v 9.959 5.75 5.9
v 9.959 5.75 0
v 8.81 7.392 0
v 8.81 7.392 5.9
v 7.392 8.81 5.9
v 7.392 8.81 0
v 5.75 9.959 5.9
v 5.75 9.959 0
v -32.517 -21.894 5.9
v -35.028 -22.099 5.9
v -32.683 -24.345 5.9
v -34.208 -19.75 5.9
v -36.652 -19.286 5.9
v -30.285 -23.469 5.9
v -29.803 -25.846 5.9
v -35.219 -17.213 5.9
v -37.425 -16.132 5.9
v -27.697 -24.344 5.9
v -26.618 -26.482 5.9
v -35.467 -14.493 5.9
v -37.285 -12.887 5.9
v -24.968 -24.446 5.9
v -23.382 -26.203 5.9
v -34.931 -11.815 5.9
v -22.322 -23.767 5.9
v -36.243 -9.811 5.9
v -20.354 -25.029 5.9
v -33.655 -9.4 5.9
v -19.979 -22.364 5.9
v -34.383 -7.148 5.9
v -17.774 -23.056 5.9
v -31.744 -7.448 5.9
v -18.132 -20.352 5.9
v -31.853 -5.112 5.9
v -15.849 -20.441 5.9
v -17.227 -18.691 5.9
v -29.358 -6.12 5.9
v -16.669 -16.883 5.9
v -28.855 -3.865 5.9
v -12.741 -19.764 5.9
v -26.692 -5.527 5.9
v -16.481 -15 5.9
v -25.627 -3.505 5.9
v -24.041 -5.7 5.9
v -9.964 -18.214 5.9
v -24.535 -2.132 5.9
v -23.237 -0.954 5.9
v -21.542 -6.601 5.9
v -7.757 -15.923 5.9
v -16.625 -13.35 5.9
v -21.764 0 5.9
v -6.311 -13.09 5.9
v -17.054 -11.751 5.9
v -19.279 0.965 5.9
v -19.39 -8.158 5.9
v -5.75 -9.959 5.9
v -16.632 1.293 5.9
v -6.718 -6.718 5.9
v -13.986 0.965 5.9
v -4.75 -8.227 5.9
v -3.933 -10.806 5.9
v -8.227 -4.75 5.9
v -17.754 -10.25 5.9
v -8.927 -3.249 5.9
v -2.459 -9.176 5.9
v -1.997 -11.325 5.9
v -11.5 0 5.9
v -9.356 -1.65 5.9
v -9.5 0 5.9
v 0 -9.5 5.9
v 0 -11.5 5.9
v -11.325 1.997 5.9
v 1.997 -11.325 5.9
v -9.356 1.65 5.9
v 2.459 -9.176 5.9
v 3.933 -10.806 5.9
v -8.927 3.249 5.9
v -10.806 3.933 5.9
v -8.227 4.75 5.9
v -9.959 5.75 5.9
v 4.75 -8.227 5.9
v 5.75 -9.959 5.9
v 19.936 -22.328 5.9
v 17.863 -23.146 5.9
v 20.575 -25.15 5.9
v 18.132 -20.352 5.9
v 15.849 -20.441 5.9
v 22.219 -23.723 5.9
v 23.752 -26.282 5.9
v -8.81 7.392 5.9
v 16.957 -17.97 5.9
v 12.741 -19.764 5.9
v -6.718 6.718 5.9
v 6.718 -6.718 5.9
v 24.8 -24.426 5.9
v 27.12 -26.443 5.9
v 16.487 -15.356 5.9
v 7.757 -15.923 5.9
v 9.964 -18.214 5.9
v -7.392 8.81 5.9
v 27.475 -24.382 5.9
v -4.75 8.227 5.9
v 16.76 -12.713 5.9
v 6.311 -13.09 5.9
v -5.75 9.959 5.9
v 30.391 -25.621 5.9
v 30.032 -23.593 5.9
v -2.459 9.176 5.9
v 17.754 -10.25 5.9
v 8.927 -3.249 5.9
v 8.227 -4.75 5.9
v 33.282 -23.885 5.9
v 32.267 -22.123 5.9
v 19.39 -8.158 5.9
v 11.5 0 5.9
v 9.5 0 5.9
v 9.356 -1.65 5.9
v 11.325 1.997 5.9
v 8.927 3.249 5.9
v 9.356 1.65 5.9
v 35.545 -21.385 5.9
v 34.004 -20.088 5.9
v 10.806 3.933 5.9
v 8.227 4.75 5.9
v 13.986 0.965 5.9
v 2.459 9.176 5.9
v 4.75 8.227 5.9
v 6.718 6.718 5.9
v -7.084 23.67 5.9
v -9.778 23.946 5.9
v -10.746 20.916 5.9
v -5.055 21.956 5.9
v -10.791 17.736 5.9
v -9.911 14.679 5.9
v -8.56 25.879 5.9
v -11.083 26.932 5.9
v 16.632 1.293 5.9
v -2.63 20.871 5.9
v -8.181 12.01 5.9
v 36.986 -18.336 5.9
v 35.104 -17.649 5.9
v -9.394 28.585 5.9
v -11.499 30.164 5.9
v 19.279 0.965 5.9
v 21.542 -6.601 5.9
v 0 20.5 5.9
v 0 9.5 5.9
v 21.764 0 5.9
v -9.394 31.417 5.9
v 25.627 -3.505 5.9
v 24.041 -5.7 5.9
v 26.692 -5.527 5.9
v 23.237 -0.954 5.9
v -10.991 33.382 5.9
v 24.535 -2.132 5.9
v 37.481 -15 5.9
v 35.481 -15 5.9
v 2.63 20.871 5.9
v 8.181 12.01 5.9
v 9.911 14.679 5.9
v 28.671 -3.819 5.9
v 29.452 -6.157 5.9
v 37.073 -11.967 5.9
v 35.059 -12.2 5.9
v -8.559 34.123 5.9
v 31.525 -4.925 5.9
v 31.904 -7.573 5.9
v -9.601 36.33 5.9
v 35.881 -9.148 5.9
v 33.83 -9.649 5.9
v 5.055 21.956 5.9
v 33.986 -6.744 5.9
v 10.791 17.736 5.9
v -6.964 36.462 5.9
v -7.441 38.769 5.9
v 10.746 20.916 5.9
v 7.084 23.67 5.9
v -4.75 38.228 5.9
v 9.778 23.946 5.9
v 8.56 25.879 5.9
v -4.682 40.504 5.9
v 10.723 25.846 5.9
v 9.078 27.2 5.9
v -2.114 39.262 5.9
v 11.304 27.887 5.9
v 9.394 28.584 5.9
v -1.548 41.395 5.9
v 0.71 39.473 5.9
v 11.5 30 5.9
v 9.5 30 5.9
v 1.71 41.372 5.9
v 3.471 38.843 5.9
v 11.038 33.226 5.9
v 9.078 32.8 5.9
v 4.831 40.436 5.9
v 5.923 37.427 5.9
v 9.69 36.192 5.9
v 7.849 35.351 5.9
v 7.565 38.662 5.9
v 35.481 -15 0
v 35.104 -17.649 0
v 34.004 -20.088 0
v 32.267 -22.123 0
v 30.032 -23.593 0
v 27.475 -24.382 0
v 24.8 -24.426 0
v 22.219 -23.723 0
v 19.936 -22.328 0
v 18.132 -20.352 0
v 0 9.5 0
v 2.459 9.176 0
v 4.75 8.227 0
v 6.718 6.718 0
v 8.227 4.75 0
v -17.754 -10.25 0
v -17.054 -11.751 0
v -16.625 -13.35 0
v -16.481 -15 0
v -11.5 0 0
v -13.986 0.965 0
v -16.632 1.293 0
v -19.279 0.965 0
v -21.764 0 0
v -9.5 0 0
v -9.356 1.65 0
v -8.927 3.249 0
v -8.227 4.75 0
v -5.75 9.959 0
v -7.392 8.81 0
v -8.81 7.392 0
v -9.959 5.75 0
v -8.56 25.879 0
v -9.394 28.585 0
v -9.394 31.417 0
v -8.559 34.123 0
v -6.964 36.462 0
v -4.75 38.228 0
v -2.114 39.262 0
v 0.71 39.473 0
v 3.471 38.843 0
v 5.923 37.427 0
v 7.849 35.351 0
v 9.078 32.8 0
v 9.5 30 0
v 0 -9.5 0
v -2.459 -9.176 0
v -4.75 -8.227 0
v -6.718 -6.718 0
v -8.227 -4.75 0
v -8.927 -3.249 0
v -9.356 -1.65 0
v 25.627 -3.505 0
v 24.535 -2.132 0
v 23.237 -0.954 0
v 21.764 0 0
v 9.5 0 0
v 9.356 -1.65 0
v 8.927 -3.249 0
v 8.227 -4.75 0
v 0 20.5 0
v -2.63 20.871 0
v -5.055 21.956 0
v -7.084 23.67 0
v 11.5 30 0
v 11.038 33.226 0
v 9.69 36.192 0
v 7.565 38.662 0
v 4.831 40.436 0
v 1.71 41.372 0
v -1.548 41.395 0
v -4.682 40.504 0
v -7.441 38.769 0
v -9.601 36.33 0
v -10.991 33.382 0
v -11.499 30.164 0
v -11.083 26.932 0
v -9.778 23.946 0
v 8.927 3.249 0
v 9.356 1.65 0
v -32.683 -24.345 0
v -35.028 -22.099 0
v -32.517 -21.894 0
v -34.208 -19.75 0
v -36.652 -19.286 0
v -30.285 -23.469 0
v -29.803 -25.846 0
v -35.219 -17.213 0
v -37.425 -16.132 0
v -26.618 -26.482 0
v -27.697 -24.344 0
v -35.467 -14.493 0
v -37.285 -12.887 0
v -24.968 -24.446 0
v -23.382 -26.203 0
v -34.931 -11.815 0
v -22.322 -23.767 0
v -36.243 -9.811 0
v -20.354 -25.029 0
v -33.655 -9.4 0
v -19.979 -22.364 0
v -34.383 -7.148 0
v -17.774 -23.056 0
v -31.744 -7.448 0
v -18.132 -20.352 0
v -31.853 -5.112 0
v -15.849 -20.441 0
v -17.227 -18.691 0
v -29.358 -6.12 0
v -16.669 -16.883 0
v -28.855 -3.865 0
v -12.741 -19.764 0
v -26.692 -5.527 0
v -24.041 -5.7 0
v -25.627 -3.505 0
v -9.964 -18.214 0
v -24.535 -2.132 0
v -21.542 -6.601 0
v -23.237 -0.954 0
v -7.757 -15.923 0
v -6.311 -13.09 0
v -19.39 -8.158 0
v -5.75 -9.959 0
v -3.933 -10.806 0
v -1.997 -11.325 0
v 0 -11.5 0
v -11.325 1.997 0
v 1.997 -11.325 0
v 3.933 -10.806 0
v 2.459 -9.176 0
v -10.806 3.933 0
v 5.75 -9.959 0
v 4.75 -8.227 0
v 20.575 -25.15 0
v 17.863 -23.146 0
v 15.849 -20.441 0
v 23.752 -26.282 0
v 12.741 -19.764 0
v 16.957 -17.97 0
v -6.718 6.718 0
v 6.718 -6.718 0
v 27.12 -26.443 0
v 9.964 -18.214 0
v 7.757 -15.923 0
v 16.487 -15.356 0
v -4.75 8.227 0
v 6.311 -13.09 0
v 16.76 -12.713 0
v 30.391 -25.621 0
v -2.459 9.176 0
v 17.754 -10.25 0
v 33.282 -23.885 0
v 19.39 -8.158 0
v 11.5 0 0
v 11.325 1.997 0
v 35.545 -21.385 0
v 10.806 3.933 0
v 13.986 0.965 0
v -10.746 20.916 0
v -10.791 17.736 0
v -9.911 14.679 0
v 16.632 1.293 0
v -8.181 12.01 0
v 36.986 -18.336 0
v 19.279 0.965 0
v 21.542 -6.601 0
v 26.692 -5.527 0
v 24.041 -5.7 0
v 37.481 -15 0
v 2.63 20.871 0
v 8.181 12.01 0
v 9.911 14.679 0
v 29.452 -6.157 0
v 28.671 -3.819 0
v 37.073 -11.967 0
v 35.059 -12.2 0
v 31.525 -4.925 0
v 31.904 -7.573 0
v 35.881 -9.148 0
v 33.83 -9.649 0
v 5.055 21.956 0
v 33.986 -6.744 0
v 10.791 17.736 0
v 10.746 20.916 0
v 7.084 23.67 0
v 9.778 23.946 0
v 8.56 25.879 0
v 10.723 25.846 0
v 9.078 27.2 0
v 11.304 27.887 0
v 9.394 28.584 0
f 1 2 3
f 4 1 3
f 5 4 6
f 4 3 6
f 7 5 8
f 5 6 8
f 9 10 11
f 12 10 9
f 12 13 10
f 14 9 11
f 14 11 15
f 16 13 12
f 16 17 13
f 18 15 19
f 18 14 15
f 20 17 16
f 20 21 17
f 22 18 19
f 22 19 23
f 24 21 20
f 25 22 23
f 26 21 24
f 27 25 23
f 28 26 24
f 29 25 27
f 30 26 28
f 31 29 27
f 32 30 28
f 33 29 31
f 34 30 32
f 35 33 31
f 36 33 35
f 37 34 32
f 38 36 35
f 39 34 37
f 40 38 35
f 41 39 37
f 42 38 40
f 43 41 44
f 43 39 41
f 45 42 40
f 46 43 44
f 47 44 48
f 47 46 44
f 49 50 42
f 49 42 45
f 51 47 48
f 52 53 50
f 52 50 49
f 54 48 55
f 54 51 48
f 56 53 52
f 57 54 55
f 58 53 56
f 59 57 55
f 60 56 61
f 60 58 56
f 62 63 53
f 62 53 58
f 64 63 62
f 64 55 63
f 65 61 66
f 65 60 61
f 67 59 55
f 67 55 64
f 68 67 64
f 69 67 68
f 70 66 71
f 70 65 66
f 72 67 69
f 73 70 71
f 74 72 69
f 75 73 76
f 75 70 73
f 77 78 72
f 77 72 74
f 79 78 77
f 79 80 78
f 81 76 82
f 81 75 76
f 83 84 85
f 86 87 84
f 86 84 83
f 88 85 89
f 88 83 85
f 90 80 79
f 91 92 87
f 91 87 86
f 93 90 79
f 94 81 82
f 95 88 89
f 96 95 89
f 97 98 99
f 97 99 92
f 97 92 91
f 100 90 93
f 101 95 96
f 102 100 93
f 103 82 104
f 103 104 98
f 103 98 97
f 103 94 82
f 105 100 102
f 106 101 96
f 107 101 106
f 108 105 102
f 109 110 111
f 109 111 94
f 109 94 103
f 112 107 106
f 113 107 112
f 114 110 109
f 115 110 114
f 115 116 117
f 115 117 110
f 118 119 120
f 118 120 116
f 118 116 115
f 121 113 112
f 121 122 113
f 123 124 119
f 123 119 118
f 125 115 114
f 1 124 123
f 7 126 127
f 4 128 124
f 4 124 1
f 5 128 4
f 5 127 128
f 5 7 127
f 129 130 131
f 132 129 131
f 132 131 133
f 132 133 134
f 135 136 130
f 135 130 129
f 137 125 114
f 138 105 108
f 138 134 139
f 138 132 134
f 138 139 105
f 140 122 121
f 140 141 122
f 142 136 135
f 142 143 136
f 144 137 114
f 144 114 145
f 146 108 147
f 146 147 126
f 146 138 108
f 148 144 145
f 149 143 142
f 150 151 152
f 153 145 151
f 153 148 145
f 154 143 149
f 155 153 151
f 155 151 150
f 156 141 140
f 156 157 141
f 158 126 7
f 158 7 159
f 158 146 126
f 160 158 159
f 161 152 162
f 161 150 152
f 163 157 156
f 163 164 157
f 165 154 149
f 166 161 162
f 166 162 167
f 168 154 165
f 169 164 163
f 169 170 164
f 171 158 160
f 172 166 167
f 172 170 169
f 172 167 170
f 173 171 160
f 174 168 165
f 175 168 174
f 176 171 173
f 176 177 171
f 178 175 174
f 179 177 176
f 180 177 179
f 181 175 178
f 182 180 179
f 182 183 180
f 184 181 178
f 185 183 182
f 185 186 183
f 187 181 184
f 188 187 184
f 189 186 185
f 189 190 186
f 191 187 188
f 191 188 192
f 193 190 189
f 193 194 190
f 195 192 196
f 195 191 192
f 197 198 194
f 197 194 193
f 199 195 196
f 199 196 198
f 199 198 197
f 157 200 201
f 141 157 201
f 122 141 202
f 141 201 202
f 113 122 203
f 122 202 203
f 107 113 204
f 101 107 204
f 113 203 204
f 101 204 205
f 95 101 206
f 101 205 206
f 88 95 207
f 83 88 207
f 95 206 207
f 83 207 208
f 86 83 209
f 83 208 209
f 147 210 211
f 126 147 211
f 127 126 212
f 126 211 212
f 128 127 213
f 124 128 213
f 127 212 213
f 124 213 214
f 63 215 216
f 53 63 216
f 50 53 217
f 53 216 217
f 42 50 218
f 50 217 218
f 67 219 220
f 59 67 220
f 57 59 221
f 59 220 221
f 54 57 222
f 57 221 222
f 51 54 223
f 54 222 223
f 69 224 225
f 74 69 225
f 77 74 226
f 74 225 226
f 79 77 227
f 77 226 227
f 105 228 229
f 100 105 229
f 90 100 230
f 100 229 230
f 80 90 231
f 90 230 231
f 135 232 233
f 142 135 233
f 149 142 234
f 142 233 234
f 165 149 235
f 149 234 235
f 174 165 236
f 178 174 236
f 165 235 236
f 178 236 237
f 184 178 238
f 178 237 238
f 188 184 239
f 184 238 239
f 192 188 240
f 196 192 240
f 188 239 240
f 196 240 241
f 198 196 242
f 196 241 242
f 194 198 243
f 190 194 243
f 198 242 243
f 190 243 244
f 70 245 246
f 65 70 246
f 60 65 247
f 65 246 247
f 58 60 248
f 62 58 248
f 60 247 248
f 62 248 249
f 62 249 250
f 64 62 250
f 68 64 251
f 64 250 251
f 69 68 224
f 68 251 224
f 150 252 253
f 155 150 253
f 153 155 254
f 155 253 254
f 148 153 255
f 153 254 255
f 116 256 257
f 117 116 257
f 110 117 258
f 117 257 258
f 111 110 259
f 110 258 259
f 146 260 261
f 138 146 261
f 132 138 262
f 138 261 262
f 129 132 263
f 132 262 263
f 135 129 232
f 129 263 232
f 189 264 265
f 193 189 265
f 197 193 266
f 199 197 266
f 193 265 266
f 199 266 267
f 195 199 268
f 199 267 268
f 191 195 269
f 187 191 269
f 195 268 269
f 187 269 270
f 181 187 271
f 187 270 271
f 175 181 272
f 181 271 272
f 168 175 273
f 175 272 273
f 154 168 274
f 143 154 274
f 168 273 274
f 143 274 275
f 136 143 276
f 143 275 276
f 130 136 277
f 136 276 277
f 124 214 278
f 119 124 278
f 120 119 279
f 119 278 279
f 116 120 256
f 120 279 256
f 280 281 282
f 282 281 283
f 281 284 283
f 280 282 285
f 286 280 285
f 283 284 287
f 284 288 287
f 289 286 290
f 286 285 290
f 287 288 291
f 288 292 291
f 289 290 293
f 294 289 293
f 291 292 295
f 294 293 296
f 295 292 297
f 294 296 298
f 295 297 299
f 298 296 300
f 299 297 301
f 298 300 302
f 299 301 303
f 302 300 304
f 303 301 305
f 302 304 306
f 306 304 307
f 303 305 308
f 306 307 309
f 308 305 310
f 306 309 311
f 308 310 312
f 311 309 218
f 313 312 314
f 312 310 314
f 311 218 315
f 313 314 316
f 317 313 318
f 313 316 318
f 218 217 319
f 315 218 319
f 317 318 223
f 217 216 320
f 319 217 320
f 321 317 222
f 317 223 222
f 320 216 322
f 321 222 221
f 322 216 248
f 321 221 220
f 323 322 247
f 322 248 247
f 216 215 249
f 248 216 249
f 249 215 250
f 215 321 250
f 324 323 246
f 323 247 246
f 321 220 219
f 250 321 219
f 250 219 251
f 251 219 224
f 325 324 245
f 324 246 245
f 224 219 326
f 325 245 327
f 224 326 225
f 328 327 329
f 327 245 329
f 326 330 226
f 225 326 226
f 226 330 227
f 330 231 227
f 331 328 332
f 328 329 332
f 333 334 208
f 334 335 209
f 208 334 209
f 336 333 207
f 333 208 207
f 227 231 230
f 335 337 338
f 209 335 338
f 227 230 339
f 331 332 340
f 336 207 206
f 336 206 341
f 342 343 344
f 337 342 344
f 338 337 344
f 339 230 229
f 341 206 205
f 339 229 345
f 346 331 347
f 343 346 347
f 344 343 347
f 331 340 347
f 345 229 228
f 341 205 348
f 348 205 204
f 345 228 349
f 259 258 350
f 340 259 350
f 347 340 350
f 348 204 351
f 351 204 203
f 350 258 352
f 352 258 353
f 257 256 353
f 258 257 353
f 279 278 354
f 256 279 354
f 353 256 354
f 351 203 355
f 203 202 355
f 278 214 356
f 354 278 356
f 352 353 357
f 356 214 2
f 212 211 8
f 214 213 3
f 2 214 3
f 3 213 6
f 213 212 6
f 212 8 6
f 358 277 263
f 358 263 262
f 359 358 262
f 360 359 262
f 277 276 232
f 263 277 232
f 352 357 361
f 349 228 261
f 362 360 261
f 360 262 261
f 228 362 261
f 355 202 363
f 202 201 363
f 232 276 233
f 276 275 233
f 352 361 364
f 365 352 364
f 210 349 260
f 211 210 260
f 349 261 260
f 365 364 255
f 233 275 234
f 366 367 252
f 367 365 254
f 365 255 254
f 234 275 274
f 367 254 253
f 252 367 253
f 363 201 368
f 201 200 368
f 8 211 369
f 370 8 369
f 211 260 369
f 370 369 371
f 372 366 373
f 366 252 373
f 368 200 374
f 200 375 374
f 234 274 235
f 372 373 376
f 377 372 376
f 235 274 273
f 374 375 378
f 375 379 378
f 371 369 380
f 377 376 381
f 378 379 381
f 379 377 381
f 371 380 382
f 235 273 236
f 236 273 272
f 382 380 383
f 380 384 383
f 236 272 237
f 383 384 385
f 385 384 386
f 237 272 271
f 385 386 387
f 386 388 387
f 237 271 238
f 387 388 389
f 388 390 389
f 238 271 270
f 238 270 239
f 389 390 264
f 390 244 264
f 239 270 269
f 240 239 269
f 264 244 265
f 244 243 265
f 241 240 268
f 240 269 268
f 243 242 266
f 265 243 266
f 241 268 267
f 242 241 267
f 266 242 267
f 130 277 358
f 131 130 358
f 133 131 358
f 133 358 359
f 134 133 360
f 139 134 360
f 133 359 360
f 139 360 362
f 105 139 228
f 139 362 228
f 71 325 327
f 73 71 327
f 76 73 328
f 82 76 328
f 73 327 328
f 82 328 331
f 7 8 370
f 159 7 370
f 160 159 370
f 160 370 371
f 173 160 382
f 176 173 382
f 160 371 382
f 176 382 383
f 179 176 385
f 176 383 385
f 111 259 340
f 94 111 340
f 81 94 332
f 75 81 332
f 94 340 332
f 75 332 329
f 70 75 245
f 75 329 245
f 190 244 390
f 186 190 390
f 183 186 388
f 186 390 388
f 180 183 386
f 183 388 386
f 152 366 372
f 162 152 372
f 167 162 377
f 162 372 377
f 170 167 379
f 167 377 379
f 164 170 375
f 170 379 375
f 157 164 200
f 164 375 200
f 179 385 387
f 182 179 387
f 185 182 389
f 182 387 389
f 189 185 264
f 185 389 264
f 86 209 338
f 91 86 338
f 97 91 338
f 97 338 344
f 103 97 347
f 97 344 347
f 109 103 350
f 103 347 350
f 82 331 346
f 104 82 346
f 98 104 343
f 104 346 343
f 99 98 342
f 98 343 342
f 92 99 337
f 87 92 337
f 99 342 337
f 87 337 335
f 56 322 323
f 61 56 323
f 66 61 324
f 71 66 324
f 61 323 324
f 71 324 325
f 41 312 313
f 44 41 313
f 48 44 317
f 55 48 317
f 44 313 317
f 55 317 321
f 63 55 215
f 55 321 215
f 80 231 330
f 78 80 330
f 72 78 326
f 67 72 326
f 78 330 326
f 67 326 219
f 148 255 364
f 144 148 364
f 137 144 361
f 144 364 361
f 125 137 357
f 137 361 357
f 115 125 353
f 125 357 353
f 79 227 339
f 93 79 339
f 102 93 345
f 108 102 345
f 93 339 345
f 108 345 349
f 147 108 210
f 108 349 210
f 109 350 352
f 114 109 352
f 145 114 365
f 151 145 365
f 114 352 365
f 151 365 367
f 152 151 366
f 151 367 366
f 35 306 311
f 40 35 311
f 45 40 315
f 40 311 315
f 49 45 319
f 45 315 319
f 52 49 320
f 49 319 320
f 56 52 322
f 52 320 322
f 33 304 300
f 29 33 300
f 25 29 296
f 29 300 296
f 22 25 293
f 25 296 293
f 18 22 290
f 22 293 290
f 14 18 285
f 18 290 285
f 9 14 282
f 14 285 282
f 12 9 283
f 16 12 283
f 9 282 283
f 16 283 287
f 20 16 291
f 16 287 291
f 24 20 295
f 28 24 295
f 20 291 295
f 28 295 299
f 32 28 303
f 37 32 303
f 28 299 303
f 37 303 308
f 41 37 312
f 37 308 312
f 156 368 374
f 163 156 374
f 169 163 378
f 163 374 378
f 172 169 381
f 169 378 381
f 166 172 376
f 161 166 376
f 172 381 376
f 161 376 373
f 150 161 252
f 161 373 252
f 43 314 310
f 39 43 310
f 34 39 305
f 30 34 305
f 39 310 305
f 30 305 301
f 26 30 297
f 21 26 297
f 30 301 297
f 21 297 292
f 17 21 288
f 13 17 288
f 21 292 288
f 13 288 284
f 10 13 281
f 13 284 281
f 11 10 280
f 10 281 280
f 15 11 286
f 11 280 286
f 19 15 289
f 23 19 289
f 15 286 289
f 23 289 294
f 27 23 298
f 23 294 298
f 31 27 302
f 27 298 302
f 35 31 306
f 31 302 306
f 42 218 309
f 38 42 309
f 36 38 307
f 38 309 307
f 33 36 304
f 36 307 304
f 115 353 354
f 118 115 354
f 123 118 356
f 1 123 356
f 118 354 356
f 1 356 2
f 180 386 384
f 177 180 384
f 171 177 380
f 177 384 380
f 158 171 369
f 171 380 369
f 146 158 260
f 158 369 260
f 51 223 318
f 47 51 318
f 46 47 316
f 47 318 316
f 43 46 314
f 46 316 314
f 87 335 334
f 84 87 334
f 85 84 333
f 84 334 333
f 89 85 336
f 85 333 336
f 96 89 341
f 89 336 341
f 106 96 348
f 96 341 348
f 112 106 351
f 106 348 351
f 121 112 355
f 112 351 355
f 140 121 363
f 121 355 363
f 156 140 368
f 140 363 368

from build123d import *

# Parameters (mm, degrees)
F1_DEPTH = 5.9


with BuildPart() as f1:
    # F0 (on Top) → F1 (new body)
    with BuildSketch(Plane.XY):
        with BuildLine():
            Line((11.5, 0), (9.5, 0))
            ThreePointArc((9.5, 0), (9.1762953497, -2.4587809285), (8.227241336, -4.75))
            Line((8.227241336, -4.75), (9.9592921435, -5.75))
            ThreePointArc((9.9592921435, -5.75), (11.1081470023, -2.9764190187), (11.5, 0))
        make_face()
        with BuildLine():
            ThreePointArc((8.227241336, 4.75), (9.1762953497, 2.4587809285), (9.5, 0))
            Line((9.5, 0), (11.5, 0))
            ThreePointArc((11.5, 0), (11.1081470023, 2.9764190187), (9.9592921435, 5.75))
            Line((9.9592921435, 5.75), (8.227241336, 4.75))
        make_face()
        with BuildLine():
            ThreePointArc((0, 9.5), (4.75, 8.227241336), (8.227241336, 4.75))
            Line((8.227241336, 4.75), (9.9592921435, 5.75))
            ThreePointArc((9.9592921435, 5.75), (8.1317279836, 8.1317279836), (5.75, 9.9592921435))
            ThreePointArc((5.75, 9.9592921435), (2.9764190187, 11.1081470023), (0, 11.5))
            Line((0, 11.5), (0, 9.5))
        make_face()
        with BuildLine():
            Line((9.9592921435, -5.75), (8.227241336, -4.75))
            ThreePointArc((8.227241336, -4.75), (4.75, -8.227241336), (0, -9.5))
            Line((0, -9.5), (0, -11.5))
            ThreePointArc((0, -11.5), (2.9764190187, -11.1081470023), (5.75, -9.9592921435))
            ThreePointArc((5.75, -9.9592921435), (8.1317279836, -8.1317279836), (9.9592921435, -5.75))
        make_face()
        with BuildLine():
            Line((21.7644823154, 0), (11.5, 0))
            ThreePointArc((11.5, 0), (11.1081470023, -2.9764190187), (9.9592921435, -5.75))
            Line((9.9592921435, -5.75), (16.02146997, -9.25))
            ThreePointArc((16.02146997, -9.25), (20.0781480078, -5.1303927779), (25.6267837466, -3.5054491468))
            ThreePointArc((25.6267837466, -3.5054491468), (23.9098470955, -1.5167036662), (21.7644823154, 0))
        make_face()
        with BuildLine():
            ThreePointArc((21.7644823154, 0), (16.6322411577, 1.2934670156), (11.5, 0))
            Line((11.5, 0), (21.7644823154, 0))
        make_face()
        with BuildLine():
            ThreePointArc((-8.227241336, 4.75), (-4.75, 8.227241336), (0, 9.5))
            Line((0, 9.5), (0, 11.5))
            ThreePointArc((0, 11.5), (-2.9764190187, 11.1081470023), (-5.75, 9.9592921435))
            ThreePointArc((-5.75, 9.9592921435), (-8.1317279836, 8.1317279836), (-9.9592921435, 5.75))
            Line((-9.9592921435, 5.75), (-8.227241336, 4.75))
        make_face()
        with BuildLine():
            Line((0, -11.5), (0, -9.5))
            ThreePointArc((0, -9.5), (-4.75, -8.227241336), (-8.227241336, -4.75))
            Line((-8.227241336, -4.75), (-9.9592921435, -5.75))
            ThreePointArc((-9.9592921435, -5.75), (-8.1317279836, -8.1317279836), (-5.75, -9.9592921435))
            ThreePointArc((-5.75, -9.9592921435), (-2.9764190187, -11.1081470023), (0, -11.5))
        make_face()
        with BuildLine():
            Line((16.02146997, -9.25), (9.9592921435, -5.75))
            ThreePointArc((9.9592921435, -5.75), (8.1317279836, -8.1317279836), (5.75, -9.9592921435))
            ThreePointArc((5.75, -9.9592921435), (8.7759533757, -17.1498563505), (15.8491998862, -20.4407211685))
            ThreePointArc((15.8491998862, -20.4407211685), (14.4821244809, -14.8229898467), (16.02146997, -9.25))
        make_face()
        with BuildLine():
            Line((-9.9592921435, -5.75), (-8.227241336, -4.75))
            ThreePointArc((-8.227241336, -4.75), (-9.1762953497, -2.4587809285), (-9.5, 0))
            Line((-9.5, 0), (-11.5, 0))
            ThreePointArc((-11.5, 0), (-11.1081470023, -2.9764190187), (-9.9592921435, -5.75))
        make_face()
        with BuildLine():
            Line((-11.5, 0), (-9.5, 0))
            ThreePointArc((-9.5, 0), (-9.1762953497, 2.4587809285), (-8.227241336, 4.75))
            Line((-8.227241336, 4.75), (-9.9592921435, 5.75))
            ThreePointArc((-9.9592921435, 5.75), (-11.1081470023, 2.9764190187), (-11.5, 0))
        make_face()
        with BuildLine():
            Line((0, 18.5), (0, 11.5))
            ThreePointArc((0, 11.5), (2.9764190187, 11.1081470023), (5.75, 9.9592921435))
            ThreePointArc((5.75, 9.9592921435), (10.464234583, 16.1751267411), (9.7775838605, 23.9461703153))
            ThreePointArc((9.7775838605, 23.9461703153), (5.5960235268, 19.9533826246), (0, 18.5))
        make_face()
        with BuildLine():
            ThreePointArc((-5.75, 9.9592921435), (-2.9764190187, 11.1081470023), (0, 11.5))
            Line((0, 11.5), (0, 18.5))
            ThreePointArc((0, 18.5), (-5.5960235268, 19.9533826246), (-9.7775838605, 23.9461703153))
            ThreePointArc((-9.7775838605, 23.9461703153), (-10.464234583, 16.1751267411), (-5.75, 9.9592921435))
        make_face()
        with BuildLine():
            ThreePointArc((25.6267837466, -3.5054491468), (20.0781480078, -5.1303927779), (16.02146997, -9.25))
            Line((16.02146997, -9.25), (17.7535207776, -10.25))
            ThreePointArc((17.7535207776, -10.25), (21.5421151907, -6.6006897013), (26.6916116991, -5.5266324432))
            ThreePointArc((26.6916116991, -5.5266324432), (26.212648084, -4.4878813308), (25.6267837466, -3.5054491468))
        make_face()
        with BuildLine():
            Line((17.7535207776, -10.25), (16.02146997, -9.25))
            ThreePointArc((16.02146997, -9.25), (14.4821244809, -14.8229898467), (15.8491998862, -20.4407211685))
            ThreePointArc((15.8491998862, -20.4407211685), (16.9929432837, -20.4568784758), (18.1320099427, -20.3522975778))
            ThreePointArc((18.1320099427, -20.3522975778), (16.4874225591, -15.3556741558), (17.7535207776, -10.25))
        make_face()
        with BuildLine():
            Line((-16.02146997, -9.25), (-9.9592921435, -5.75))
            ThreePointArc((-9.9592921435, -5.75), (-11.1081470023, -2.9764190187), (-11.5, 0))
            Line((-11.5, 0), (-21.7644823154, 0))
            ThreePointArc((-21.7644823154, 0), (-23.9098470955, -1.5167036662), (-25.6267837466, -3.5054491468))
            ThreePointArc((-25.6267837466, -3.5054491468), (-20.0781480078, -5.1303927779), (-16.02146997, -9.25))
        make_face()
        with BuildLine():
            ThreePointArc((-5.75, -9.9592921435), (-8.1317279836, -8.1317279836), (-9.9592921435, -5.75))
            Line((-9.9592921435, -5.75), (-16.02146997, -9.25))
            ThreePointArc((-16.02146997, -9.25), (-14.8726151112, -12.0235809813), (-14.4807621135, -15))
            ThreePointArc((-14.4807621135, -15), (-14.8281174582, -17.8050877335), (-15.8491998862, -20.4407211685))
            ThreePointArc((-15.8491998862, -20.4407211685), (-8.7759533757, -17.1498563505), (-5.75, -9.9592921435))
        make_face()
        with BuildLine():
            Line((-21.7644823154, 0), (-11.5, 0))
            ThreePointArc((-11.5, 0), (-16.6322411577, 1.2934670156), (-21.7644823154, 0))
        make_face()
        with BuildLine():
            ThreePointArc((37.4807621135, -15), (33.9863616782, -6.7440702759), (25.6267837466, -3.5054491468))
            ThreePointArc((25.6267837466, -3.5054491468), (26.212648084, -4.4878813308), (26.6916116991, -5.5266324432))
            ThreePointArc((26.6916116991, -5.5266324432), (32.945066496, -8.5386948324), (35.4807621135, -15))
            ThreePointArc((35.4807621135, -15), (28.7813740446, -24.077806608), (18.1320099427, -20.3522975778))
            ThreePointArc((18.1320099427, -20.3522975778), (16.9929432837, -20.4568784758), (15.8491998862, -20.4407211685))
            ThreePointArc((15.8491998862, -20.4407211685), (28.785849847, -26.1526446553), (37.4807621135, -15))
        make_face()
        with BuildLine():
            ThreePointArc((-9.7775838605, 23.9461703153), (-5.5960235268, 19.9533826246), (0, 18.5))
            Line((0, 18.5), (0, 20.5))
            ThreePointArc((0, 20.5), (-5.0546926316, 21.956363857), (-8.5596017564, 25.8789300209))
            ThreePointArc((-8.5596017564, 25.8789300209), (-9.2197048003, 24.9447598066), (-9.7775838605, 23.9461703153))
        make_face()
        with BuildLine():
            Line((0, 20.5), (0, 18.5))
            ThreePointArc((0, 18.5), (5.5960235268, 19.9533826246), (9.7775838605, 23.9461703153))
            ThreePointArc((9.7775838605, 23.9461703153), (9.2197048003, 24.9447598066), (8.5596017564, 25.8789300209))
            ThreePointArc((8.5596017564, 25.8789300209), (5.0546926316, 21.956363857), (0, 20.5))
        make_face()
        with BuildLine():
            ThreePointArc((8.5596017564, 25.8789300209), (9.2197048003, 24.9447598066), (9.7775838605, 23.9461703153))
            ThreePointArc((9.7775838605, 23.9461703153), (11.0610174576, 26.8529549094), (11.5, 30))
            ThreePointArc((11.5, 30), (-3.1470450906, 41.0610174576), (-9.7775838605, 23.9461703153))
            ThreePointArc((-9.7775838605, 23.9461703153), (-9.2197048003, 24.9447598066), (-8.5596017564, 25.8789300209))
            ThreePointArc((-8.5596017564, 25.8789300209), (-2.1135022255, 39.2619170987), (9.5, 30))
            ThreePointArc((9.5, 30), (9.2619170987, 27.8864977745), (8.5596017564, 25.8789300209))
        make_face()
        with BuildLine():
            ThreePointArc((-14.4807621135, -15), (-14.8726151112, -12.0235809813), (-16.02146997, -9.25))
            Line((-16.02146997, -9.25), (-17.7535207776, -10.25))
            ThreePointArc((-17.7535207776, -10.25), (-16.8044667638, -12.5412190715), (-16.4807621135, -15))
            ThreePointArc((-16.4807621135, -15), (-16.9029555056, -17.8006119311), (-18.1320099427, -20.3522975778))
            ThreePointArc((-18.1320099427, -20.3522975778), (-16.9929432837, -20.4568784758), (-15.8491998862, -20.4407211685))
            ThreePointArc((-15.8491998862, -20.4407211685), (-14.8281174582, -17.8050877335), (-14.4807621135, -15))
        make_face()
        with BuildLine():
            Line((-17.7535207776, -10.25), (-16.02146997, -9.25))
            ThreePointArc((-16.02146997, -9.25), (-20.0781480078, -5.1303927779), (-25.6267837466, -3.5054491468))
            ThreePointArc((-25.6267837466, -3.5054491468), (-26.212648084, -4.4878813308), (-26.6916116991, -5.5266324432))
            ThreePointArc((-26.6916116991, -5.5266324432), (-21.5421151907, -6.6006897013), (-17.7535207776, -10.25))
        make_face()
        with BuildLine():
            ThreePointArc((-25.6267837466, -3.5054491468), (-35.9400542571, -20.75), (-15.8491998862, -20.4407211685))
            ThreePointArc((-15.8491998862, -20.4407211685), (-16.9929432837, -20.4568784758), (-18.1320099427, -20.3522975778))
            ThreePointArc((-18.1320099427, -20.3522975778), (-34.2080034495, -19.75), (-26.6916116991, -5.5266324432))
            ThreePointArc((-26.6916116991, -5.5266324432), (-26.212648084, -4.4878813308), (-25.6267837466, -3.5054491468))
        make_face()
    extrude(amount=F1_DEPTH)


solid = f1.part
